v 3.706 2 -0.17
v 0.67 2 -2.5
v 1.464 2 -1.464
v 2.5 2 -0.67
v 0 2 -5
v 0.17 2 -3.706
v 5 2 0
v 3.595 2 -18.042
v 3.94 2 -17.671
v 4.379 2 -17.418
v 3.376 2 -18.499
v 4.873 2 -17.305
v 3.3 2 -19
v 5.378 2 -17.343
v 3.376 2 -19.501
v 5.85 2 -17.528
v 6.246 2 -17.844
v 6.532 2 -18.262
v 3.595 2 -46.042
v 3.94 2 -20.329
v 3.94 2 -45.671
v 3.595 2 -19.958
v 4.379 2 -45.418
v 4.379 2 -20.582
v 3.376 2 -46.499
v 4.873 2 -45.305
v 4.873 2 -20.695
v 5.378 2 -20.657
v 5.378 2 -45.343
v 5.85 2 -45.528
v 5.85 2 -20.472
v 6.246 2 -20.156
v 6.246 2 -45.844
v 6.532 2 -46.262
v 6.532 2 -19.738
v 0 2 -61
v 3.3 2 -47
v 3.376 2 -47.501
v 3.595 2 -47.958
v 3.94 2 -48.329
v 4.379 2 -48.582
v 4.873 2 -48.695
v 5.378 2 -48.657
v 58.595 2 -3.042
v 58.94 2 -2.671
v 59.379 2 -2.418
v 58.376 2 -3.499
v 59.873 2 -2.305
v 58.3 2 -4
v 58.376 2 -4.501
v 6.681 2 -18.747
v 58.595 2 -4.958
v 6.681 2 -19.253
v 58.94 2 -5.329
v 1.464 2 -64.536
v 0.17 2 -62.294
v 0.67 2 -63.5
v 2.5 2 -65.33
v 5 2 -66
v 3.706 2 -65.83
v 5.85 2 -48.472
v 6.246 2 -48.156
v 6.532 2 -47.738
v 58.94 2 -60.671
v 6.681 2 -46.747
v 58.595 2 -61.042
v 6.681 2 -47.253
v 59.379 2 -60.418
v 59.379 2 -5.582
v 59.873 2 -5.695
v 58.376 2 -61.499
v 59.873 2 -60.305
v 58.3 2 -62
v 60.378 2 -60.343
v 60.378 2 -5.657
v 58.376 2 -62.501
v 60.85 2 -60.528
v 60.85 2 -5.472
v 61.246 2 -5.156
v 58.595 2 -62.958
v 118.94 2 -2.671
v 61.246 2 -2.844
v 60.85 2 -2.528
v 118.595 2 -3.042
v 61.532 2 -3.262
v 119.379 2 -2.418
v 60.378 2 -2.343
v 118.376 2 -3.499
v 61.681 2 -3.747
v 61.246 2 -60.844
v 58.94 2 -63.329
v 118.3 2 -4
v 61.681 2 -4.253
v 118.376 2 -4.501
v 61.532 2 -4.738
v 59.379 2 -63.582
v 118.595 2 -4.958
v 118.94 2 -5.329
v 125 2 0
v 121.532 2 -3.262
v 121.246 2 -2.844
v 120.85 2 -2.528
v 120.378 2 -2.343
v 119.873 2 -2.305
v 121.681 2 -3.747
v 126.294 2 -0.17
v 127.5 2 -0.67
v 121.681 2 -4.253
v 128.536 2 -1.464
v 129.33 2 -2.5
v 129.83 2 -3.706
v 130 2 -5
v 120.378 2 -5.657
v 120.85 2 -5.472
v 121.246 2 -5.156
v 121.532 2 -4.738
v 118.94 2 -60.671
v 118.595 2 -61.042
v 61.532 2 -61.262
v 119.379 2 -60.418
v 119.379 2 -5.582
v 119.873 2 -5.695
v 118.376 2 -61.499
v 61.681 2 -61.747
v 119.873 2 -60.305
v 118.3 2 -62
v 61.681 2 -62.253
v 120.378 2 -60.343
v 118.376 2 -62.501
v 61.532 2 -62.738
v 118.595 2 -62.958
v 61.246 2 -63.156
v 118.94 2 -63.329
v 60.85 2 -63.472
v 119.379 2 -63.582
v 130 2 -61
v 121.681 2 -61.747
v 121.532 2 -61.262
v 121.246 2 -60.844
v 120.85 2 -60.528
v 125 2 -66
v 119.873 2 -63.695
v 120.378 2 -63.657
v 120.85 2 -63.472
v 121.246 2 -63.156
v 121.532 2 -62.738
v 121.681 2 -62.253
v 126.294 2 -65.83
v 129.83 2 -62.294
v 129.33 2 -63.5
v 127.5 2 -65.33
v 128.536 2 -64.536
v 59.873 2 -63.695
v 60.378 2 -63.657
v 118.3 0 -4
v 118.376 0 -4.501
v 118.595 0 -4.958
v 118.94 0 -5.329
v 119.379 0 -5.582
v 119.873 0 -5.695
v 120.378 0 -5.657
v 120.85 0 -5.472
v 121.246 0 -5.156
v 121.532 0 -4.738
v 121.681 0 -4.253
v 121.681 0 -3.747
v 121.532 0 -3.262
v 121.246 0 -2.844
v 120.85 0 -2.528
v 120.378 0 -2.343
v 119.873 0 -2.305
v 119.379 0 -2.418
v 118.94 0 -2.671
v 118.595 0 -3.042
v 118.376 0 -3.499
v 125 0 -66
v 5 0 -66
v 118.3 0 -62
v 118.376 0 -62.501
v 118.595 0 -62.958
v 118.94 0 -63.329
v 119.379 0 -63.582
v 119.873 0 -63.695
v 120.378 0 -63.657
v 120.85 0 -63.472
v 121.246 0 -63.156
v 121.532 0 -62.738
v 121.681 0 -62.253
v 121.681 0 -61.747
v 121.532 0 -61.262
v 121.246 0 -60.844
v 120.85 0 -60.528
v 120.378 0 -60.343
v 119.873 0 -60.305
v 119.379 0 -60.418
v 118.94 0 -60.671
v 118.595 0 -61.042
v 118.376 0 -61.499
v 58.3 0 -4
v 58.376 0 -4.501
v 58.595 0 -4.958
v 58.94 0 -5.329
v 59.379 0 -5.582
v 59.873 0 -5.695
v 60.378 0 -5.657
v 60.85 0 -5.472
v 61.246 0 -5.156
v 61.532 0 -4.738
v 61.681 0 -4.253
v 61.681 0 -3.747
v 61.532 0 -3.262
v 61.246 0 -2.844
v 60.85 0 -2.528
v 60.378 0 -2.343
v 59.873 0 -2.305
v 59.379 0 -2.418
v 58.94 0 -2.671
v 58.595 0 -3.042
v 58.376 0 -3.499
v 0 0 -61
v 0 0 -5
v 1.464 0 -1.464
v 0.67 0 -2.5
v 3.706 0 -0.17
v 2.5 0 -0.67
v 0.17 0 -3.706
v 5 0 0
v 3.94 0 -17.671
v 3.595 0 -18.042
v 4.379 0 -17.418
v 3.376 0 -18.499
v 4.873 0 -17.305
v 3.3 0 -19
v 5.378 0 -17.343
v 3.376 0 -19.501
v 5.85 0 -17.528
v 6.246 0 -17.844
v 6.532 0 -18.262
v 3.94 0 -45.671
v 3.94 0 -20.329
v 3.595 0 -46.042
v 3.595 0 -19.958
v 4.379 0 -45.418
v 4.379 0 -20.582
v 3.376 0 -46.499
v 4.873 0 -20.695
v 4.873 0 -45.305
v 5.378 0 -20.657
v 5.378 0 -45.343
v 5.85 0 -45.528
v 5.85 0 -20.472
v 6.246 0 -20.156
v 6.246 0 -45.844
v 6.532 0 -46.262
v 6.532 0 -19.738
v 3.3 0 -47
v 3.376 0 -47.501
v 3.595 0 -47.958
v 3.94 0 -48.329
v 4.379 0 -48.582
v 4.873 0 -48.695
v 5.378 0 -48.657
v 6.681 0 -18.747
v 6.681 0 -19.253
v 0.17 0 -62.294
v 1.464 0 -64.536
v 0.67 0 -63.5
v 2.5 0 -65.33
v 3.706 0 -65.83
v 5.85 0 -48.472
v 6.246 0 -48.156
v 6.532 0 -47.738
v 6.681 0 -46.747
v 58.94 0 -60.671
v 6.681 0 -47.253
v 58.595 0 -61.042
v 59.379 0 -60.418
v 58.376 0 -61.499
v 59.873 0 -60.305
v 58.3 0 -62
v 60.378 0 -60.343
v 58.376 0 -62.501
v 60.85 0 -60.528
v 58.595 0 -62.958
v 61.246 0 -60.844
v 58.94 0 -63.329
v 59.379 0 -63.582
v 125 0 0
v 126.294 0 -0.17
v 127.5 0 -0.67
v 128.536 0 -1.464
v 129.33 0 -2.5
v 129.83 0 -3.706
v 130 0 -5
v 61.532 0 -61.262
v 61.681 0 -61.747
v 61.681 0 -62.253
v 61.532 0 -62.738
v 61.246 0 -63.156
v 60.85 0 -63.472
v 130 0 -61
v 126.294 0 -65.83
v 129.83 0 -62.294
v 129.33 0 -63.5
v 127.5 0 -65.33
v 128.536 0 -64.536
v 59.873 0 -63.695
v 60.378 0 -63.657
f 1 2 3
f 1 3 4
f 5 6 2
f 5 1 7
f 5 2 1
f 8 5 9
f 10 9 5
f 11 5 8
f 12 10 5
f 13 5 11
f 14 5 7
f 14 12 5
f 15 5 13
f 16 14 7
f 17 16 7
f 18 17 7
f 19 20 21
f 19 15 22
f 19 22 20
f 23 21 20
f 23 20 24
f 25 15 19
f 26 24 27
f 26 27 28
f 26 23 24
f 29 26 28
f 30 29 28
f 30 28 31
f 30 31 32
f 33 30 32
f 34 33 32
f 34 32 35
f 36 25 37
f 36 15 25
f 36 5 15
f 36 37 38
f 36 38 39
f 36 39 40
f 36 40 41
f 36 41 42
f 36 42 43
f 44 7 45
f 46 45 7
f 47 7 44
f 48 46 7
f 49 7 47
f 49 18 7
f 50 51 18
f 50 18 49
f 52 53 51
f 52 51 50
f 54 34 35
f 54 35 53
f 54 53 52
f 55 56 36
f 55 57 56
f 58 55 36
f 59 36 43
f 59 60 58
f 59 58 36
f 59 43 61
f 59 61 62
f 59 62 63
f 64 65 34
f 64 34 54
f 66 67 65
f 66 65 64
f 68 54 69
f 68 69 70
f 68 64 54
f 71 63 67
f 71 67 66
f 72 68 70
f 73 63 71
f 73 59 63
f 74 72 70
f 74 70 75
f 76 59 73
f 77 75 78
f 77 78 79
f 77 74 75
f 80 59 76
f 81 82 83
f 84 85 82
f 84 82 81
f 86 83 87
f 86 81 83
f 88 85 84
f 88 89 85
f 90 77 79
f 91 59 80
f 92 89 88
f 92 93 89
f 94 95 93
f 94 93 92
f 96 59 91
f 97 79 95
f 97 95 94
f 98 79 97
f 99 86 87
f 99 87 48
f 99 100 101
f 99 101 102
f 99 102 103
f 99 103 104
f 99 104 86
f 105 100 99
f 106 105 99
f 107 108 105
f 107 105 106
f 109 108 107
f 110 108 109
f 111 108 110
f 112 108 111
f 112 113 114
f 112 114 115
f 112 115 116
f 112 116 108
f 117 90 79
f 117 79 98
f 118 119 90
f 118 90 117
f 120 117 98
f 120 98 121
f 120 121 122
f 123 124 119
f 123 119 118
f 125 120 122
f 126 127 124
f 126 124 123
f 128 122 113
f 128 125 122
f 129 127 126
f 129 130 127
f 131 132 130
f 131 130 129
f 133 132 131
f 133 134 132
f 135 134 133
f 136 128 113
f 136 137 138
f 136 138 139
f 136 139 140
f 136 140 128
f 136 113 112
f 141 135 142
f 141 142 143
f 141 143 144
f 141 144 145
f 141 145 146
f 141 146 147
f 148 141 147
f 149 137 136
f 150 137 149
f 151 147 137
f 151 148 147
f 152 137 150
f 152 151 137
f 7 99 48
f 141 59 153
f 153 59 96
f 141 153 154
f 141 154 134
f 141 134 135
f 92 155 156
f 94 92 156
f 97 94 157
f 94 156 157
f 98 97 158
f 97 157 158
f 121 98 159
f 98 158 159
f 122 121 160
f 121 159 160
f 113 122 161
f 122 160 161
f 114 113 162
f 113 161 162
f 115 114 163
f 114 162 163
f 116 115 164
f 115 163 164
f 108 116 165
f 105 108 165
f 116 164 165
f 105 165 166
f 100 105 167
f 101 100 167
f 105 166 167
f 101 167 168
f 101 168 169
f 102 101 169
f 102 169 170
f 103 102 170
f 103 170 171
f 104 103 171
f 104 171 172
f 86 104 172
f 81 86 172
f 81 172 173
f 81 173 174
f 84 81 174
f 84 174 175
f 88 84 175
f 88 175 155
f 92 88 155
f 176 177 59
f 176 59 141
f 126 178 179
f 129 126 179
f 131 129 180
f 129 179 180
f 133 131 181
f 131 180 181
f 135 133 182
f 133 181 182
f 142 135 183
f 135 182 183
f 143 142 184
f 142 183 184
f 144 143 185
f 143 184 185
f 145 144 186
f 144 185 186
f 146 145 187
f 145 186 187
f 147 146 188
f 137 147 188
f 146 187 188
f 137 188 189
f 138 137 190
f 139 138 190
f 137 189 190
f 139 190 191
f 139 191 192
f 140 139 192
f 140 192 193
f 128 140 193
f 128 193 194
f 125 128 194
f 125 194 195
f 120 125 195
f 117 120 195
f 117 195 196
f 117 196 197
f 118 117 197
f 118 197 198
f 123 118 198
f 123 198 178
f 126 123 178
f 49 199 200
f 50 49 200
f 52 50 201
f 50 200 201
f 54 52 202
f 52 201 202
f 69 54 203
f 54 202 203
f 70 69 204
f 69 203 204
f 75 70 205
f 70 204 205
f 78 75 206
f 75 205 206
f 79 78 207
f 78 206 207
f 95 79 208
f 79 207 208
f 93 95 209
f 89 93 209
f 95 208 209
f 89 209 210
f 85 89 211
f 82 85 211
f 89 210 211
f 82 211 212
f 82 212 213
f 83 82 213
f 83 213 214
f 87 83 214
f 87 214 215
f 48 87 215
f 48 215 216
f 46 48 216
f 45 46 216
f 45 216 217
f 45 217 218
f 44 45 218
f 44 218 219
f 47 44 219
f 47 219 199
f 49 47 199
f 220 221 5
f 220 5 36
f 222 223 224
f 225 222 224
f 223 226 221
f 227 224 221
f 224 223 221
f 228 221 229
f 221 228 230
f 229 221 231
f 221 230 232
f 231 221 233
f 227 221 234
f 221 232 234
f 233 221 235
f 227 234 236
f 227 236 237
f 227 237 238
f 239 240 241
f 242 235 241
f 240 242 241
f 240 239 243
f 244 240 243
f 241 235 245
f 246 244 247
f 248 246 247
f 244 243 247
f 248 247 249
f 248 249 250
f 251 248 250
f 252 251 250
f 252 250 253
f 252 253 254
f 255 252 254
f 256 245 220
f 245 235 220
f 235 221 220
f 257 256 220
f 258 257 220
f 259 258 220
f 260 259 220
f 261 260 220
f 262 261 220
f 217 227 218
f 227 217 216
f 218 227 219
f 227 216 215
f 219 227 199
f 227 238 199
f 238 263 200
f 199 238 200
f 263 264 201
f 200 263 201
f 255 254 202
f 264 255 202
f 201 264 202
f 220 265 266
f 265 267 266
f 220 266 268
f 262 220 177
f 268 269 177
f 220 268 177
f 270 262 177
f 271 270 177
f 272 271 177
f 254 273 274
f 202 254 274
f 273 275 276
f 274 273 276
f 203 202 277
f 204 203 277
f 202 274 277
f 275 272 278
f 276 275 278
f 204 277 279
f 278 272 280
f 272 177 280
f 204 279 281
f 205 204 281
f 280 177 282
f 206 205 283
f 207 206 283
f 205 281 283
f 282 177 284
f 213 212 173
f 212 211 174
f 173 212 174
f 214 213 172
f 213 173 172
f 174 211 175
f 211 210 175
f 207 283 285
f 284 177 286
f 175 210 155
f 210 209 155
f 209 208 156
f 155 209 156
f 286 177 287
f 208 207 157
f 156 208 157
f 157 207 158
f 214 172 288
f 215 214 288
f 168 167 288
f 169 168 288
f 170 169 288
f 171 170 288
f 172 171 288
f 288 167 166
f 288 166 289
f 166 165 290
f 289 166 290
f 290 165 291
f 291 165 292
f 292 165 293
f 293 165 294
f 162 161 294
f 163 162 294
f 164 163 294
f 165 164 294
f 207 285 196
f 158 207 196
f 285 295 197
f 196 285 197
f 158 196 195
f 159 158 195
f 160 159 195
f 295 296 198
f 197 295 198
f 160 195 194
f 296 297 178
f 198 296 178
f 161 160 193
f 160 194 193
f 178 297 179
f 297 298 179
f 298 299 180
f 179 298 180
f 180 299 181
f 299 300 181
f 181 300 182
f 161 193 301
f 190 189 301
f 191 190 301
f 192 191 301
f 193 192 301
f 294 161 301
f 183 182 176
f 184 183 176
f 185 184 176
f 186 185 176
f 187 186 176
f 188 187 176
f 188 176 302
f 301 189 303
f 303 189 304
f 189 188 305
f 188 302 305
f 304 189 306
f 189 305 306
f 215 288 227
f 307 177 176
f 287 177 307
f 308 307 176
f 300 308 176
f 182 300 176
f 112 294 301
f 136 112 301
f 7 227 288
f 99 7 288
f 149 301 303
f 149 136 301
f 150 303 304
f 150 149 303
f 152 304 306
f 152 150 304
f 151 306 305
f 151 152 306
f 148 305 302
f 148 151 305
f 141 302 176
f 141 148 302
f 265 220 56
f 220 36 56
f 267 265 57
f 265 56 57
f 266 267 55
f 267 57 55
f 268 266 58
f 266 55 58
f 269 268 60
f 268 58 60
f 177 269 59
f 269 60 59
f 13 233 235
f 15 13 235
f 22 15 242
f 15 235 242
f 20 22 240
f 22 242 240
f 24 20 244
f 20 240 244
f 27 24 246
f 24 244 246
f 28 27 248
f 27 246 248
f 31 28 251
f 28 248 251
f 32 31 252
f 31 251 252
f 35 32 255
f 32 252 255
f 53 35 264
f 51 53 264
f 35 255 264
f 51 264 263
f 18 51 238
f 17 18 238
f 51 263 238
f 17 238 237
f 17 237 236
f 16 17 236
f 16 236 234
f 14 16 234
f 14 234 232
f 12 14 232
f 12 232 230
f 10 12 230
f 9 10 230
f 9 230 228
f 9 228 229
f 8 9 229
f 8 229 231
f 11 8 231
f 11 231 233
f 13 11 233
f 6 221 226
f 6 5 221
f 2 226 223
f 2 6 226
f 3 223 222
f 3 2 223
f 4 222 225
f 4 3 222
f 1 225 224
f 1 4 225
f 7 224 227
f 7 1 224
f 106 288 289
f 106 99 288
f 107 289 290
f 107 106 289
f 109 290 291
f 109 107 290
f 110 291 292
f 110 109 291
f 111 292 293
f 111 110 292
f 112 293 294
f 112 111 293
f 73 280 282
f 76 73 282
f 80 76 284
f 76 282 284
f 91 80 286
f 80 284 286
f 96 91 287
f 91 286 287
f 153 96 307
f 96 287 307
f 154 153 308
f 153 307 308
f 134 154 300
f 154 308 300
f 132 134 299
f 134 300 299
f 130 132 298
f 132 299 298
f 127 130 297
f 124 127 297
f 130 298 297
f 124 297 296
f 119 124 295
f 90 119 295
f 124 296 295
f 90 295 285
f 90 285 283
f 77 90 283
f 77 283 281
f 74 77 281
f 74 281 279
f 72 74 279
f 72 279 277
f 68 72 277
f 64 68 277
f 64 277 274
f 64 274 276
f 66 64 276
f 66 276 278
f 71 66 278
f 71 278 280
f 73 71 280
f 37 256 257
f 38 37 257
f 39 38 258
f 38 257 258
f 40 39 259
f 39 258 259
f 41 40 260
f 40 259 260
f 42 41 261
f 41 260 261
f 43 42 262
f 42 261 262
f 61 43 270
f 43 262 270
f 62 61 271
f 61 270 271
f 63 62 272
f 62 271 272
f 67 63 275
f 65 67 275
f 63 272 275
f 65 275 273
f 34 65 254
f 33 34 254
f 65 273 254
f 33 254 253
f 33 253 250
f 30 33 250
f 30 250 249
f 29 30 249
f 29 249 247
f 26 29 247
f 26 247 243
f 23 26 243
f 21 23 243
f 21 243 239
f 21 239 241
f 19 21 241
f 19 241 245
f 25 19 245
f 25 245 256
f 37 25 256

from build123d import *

# Parameters (mm, degrees)
SKETCH1_W            = 130
SKETCH1_H            = 66
BOSS_EXTRUDE1_DEPTH  = 2
FILLET1_R            = 5
M3_CLEARANCE_HOLE1_D = 3.4


with BuildPart() as part:
    # Sketch1 → Boss-Extrude1 (new body)
    with BuildSketch(Plane(origin=(0, 0, 0), x_dir=(1, 0, 0), z_dir=(0, 1, 0))):
        with Locations((65, 33)):
            Rectangle(SKETCH1_W, SKETCH1_H)
    extrude(amount=BOSS_EXTRUDE1_DEPTH)

    # Fillet1
    fillet1_edges = [part.edges().sort_by_distance(p)[0] for p in [
        (0, 1, -66),
        (130, 1, -66),
        (130, 1, 0),
        (0, 1, 0),
    ]]
    fillet(fillet1_edges, radius=FILLET1_R)

    # M3 Clearance Hole1 (through all)
    with Locations(Plane(origin=(0, 2, 0), x_dir=(1, 0, 0), z_dir=(0, 1, 0))):
        with Locations((5, 19), (60, 4), (120, 4), (120, 62), (60, 62), (5, 47)):
            Hole(M3_CLEARANCE_HOLE1_D / 2)


solid = part.part
